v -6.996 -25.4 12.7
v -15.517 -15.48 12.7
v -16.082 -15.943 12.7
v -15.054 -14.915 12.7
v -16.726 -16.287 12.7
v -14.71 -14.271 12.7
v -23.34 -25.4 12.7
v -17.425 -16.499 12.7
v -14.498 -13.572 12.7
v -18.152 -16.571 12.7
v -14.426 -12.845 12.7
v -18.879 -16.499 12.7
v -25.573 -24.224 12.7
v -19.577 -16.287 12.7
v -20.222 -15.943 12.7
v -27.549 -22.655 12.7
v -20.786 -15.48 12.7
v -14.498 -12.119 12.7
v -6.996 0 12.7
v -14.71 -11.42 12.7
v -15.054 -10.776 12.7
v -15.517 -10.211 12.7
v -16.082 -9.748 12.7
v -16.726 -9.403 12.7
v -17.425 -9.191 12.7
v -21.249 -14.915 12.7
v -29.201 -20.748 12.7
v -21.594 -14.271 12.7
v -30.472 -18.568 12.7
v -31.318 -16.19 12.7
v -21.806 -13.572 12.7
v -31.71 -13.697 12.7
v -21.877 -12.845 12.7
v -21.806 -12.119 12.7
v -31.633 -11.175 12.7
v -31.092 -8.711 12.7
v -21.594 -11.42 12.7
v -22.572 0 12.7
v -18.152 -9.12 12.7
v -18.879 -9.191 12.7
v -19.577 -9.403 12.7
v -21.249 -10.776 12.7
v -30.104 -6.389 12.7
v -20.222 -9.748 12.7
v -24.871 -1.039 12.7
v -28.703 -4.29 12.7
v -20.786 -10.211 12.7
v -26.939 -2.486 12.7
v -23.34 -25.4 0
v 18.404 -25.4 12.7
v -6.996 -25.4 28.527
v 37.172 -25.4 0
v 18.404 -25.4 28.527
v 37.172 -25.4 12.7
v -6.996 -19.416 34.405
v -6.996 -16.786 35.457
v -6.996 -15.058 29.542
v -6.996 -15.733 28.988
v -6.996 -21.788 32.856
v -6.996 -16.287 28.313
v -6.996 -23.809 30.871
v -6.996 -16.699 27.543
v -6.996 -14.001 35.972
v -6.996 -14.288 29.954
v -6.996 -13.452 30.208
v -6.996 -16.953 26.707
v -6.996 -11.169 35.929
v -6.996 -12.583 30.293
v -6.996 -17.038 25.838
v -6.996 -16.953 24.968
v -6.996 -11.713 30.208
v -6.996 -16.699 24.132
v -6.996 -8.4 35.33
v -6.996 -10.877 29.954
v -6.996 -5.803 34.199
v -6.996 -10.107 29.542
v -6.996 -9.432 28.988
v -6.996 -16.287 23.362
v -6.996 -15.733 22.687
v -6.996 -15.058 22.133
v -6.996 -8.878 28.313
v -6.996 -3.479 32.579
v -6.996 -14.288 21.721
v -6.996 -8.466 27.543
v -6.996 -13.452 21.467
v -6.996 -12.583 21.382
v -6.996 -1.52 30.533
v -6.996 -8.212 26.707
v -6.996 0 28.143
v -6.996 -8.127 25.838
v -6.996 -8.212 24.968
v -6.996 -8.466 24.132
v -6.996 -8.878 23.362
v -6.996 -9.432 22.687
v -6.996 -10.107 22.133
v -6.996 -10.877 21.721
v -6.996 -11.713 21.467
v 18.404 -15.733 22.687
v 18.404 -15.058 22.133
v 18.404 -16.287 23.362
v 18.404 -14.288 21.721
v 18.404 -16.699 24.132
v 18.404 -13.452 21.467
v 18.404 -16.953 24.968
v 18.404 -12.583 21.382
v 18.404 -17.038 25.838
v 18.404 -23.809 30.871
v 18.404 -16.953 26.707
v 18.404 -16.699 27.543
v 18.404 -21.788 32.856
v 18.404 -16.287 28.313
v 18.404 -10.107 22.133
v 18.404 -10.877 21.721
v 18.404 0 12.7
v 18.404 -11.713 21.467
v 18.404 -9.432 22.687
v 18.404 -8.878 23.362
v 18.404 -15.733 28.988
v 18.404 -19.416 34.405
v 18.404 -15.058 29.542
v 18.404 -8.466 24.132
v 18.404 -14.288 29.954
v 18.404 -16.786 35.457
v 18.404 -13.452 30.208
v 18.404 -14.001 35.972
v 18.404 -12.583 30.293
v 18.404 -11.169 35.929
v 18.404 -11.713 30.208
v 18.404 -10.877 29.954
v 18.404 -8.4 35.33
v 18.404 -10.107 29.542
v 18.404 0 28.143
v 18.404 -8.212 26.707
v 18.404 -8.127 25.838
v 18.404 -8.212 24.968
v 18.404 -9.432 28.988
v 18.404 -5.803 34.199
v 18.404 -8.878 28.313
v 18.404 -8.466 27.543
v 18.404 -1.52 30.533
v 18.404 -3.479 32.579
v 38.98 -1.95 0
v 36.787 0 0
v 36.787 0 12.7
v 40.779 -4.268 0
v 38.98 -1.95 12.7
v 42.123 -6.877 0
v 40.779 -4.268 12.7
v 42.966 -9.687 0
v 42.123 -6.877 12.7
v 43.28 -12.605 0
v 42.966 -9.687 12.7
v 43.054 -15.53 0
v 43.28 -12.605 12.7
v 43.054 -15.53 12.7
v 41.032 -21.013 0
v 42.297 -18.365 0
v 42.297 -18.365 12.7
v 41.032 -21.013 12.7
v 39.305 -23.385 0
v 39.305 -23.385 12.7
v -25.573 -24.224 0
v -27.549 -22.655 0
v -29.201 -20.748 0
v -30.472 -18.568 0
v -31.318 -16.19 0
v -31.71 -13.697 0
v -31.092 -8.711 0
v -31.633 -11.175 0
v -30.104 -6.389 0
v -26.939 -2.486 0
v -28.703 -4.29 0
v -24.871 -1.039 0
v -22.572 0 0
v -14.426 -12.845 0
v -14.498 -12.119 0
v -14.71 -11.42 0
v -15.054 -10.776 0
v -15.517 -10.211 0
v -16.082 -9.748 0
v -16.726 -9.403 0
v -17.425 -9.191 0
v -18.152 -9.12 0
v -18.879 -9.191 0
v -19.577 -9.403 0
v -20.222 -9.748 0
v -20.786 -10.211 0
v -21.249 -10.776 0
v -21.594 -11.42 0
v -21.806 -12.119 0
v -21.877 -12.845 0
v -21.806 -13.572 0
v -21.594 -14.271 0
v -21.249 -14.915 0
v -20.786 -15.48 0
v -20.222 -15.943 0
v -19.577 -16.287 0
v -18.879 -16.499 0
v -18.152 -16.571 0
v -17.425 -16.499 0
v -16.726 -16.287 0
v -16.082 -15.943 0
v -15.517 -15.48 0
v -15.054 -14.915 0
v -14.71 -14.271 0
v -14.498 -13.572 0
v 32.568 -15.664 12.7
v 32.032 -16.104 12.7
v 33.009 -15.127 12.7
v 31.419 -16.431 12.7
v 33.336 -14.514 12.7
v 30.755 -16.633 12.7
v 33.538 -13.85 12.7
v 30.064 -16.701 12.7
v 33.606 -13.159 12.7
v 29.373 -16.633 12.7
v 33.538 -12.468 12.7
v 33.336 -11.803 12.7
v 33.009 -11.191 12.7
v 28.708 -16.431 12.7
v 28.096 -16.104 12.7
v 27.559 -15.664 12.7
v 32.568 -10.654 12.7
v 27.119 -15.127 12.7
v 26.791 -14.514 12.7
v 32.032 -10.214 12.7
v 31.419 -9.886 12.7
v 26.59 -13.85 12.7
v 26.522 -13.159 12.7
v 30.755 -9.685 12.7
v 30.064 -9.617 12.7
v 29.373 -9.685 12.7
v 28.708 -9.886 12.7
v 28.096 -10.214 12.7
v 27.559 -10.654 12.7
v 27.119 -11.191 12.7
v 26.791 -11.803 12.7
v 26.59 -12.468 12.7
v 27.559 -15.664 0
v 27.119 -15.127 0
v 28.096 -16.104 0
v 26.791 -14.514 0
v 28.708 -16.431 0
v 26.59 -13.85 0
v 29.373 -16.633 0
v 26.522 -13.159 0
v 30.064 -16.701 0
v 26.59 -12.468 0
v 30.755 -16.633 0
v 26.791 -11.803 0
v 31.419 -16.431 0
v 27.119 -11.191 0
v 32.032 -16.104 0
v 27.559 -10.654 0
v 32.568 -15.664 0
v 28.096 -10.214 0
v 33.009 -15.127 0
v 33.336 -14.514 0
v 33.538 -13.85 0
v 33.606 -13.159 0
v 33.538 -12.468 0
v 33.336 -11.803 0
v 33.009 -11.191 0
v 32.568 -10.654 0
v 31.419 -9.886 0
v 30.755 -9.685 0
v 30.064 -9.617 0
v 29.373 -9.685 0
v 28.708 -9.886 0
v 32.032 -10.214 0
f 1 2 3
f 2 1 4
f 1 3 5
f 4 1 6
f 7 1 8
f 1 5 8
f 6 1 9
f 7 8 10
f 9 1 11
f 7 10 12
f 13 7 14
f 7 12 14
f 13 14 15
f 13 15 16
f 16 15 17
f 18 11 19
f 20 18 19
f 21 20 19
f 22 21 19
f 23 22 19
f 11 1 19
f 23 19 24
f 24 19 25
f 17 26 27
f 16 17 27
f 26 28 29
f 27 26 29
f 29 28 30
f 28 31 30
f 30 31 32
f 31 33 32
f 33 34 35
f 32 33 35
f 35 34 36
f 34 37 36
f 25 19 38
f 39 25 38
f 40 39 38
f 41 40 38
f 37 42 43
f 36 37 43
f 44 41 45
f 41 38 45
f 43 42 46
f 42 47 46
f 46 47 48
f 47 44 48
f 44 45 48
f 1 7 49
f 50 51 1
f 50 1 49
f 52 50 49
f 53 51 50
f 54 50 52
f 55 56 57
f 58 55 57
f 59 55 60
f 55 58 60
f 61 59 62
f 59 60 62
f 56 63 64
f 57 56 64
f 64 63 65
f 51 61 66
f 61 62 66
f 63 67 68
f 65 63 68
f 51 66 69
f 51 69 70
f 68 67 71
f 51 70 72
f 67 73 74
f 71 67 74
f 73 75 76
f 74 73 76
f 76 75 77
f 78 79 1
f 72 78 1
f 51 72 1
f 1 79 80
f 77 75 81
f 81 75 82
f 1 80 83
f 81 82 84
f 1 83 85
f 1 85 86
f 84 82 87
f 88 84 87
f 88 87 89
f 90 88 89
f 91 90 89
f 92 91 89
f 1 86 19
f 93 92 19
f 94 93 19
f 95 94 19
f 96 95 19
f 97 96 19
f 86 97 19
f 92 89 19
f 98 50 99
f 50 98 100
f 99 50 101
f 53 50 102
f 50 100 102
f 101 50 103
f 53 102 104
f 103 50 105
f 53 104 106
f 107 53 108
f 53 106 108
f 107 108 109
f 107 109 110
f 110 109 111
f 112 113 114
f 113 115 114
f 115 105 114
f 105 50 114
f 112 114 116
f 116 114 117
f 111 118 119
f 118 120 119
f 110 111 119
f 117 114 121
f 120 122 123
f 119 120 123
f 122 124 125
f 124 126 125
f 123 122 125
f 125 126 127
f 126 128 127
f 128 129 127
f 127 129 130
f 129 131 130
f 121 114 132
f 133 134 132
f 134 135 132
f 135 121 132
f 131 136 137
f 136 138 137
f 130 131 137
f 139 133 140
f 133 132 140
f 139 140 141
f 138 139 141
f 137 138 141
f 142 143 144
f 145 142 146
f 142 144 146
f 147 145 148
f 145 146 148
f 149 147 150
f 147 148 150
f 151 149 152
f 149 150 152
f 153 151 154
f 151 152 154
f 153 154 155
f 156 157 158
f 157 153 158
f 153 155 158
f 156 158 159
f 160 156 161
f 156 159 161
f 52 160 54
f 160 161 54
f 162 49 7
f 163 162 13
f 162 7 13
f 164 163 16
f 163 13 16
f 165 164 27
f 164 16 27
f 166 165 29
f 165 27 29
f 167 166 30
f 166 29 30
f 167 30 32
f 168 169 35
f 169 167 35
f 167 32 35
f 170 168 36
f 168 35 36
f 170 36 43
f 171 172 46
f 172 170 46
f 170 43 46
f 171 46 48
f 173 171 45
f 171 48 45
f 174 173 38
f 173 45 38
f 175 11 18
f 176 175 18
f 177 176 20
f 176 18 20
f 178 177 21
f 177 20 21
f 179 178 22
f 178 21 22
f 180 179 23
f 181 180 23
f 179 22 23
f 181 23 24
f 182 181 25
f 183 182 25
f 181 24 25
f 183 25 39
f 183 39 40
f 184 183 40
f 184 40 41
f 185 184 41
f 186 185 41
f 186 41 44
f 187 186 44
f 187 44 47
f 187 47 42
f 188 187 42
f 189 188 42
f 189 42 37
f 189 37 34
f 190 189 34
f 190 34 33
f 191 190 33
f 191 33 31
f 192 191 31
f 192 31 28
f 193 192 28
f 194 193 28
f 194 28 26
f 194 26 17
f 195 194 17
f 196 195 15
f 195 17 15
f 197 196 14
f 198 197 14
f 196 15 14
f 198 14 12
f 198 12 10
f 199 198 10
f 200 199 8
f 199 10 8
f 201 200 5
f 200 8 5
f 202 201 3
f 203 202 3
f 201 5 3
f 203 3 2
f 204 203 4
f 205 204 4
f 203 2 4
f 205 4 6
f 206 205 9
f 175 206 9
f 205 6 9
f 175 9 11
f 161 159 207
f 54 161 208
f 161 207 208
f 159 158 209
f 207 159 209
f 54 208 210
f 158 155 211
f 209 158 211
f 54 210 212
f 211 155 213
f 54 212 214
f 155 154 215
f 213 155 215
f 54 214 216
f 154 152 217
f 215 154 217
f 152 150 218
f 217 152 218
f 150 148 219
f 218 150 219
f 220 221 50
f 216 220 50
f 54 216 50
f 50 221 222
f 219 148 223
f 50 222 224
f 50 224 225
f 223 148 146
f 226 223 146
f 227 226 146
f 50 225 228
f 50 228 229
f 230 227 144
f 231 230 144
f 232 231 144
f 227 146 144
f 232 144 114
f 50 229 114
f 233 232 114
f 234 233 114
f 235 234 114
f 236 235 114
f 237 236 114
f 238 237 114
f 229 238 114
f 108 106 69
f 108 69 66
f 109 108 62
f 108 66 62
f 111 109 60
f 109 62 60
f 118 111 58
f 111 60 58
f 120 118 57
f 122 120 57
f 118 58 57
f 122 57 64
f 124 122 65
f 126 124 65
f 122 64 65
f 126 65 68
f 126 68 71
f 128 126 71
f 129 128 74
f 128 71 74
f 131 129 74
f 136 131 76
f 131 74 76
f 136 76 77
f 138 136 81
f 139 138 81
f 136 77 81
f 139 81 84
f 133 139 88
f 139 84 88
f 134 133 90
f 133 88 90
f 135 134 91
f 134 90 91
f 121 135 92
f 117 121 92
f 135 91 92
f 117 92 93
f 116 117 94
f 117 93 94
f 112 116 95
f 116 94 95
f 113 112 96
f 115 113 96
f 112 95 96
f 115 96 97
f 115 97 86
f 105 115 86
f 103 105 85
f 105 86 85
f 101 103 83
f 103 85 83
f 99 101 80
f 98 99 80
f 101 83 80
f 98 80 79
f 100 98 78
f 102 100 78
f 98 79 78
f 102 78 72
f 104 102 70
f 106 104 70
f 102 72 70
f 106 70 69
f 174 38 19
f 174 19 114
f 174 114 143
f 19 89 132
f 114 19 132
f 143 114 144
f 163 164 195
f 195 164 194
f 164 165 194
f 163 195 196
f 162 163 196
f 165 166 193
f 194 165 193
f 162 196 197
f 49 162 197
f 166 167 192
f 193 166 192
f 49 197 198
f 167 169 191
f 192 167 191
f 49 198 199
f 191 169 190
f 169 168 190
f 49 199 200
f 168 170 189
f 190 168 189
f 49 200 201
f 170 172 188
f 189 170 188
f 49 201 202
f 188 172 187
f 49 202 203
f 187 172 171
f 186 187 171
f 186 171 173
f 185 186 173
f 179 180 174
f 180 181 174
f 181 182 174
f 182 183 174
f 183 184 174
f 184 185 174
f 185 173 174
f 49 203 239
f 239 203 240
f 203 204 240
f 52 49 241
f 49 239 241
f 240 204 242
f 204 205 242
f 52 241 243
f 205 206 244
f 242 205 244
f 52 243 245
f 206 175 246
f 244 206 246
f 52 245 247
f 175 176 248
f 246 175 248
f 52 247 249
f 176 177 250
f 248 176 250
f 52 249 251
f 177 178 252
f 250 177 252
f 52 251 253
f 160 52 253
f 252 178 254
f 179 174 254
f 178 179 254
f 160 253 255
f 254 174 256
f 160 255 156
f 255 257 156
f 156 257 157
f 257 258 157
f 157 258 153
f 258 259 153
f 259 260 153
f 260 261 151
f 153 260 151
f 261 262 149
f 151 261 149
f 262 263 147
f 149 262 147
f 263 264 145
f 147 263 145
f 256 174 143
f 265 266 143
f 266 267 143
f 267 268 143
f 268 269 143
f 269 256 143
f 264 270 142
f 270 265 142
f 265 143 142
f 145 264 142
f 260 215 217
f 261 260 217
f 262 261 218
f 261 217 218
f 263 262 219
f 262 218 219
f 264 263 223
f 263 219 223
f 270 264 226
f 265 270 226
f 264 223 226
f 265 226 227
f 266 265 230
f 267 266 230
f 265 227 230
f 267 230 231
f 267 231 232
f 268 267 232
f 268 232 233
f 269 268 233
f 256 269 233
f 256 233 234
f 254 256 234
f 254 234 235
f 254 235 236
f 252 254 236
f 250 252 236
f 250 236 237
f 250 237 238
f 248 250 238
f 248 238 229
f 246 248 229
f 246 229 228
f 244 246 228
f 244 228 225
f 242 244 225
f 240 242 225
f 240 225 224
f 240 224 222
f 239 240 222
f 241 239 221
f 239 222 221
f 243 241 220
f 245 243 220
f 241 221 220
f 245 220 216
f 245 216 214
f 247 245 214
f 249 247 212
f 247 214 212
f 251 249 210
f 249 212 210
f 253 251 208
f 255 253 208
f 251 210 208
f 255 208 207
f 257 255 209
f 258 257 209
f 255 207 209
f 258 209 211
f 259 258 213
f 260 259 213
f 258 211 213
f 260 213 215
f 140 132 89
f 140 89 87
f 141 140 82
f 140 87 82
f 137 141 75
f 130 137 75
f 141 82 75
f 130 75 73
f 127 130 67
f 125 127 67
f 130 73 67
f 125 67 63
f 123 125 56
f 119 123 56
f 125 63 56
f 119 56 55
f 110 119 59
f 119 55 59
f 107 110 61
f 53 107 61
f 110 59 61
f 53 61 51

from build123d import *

# Parameters (mm, degrees)
F1_DEPTH  = 25.4
F3_DEPTH  = 25.4
F5_DEPTH  = 25.4
F7_DEPTH  = 25.4
F8_R      = 3.725598
F8_R_2    = 3.542164
F9_DEPTH  = 25.4
F10_R     = 4.455747
F11_DEPTH = 25.4


with BuildPart() as f1:
    # F0 (on Front) → F1 (new body)
    with BuildSketch(Plane.XZ):
        Polygon((-32.395763, 12.7), (-32.395763, 0), (43.804237, 0), (43.804237, 12.7), (18.404237, 12.7), (18.404237, 36.485594), (-6.995763, 36.485594), (-6.995763, 12.7), align=None)
    extrude(amount=F1_DEPTH)

    # F2 (on face) → F3 (cut)
    with BuildSketch(Plane(origin=(-6.995763, 0, 0), x_dir=(0, -1, 0), z_dir=(-1, 0, 0))):
        with BuildLine():
            ThreePointArc((0, 28.142773), (12.583745, 36.02061), (25.4, 28.526975))
            Line((25.4, 28.526975), (25.4, 36.485594))
            Line((25.4, 36.485594), (0, 36.485594))
            Line((0, 36.485594), (0, 28.142773))
        make_face()
    extrude(amount=-F3_DEPTH, mode=Mode.SUBTRACT)

    # F4 (on face) → F5 (cut)
    with BuildSketch(Plane.XY.offset(12.7)):
        with BuildLine():
            ThreePointArc((-23.340253, -25.4), (-31.730093, -12.434566), (-22.571849, 0))
            Line((-22.571849, 0), (-32.395763, 0))
            Line((-32.395763, 0), (-32.395763, -25.4))
            Line((-32.395763, -25.4), (-23.340253, -25.4))
        make_face()
    extrude(amount=-F5_DEPTH, mode=Mode.SUBTRACT)

    # F6 (on face) → F7 (cut)
    with BuildSketch(Plane.XY.offset(12.7)):
        with BuildLine():
            ThreePointArc((36.787312, 0), (43.280053, -12.604697), (37.171513, -25.4))
            Line((37.171513, -25.4), (43.804237, -25.4))
            Line((43.804237, -25.4), (43.804237, 0))
            Line((43.804237, 0), (36.787312, 0))
        make_face()
    extrude(amount=-F7_DEPTH, mode=Mode.SUBTRACT)

    # F8 (on face) → F9 (cut)
    with BuildSketch(Plane.XY.offset(12.7)):
        with Locations((-18.151755, -12.84534)):
            Circle(F8_R)
        with Locations((30.063784, -13.158907)):
            Circle(F8_R_2)
    extrude(amount=-F9_DEPTH, mode=Mode.SUBTRACT)

    # F10 (on face) → F11 (cut)
    with BuildSketch(Plane(origin=(-6.995763, 0, 0), x_dir=(0, -1, 0), z_dir=(-1, 0, 0))):
        with Locations((12.582604, 25.837563)):
            Circle(F10_R)
    extrude(amount=-F11_DEPTH, mode=Mode.SUBTRACT)


solid = f1.part
